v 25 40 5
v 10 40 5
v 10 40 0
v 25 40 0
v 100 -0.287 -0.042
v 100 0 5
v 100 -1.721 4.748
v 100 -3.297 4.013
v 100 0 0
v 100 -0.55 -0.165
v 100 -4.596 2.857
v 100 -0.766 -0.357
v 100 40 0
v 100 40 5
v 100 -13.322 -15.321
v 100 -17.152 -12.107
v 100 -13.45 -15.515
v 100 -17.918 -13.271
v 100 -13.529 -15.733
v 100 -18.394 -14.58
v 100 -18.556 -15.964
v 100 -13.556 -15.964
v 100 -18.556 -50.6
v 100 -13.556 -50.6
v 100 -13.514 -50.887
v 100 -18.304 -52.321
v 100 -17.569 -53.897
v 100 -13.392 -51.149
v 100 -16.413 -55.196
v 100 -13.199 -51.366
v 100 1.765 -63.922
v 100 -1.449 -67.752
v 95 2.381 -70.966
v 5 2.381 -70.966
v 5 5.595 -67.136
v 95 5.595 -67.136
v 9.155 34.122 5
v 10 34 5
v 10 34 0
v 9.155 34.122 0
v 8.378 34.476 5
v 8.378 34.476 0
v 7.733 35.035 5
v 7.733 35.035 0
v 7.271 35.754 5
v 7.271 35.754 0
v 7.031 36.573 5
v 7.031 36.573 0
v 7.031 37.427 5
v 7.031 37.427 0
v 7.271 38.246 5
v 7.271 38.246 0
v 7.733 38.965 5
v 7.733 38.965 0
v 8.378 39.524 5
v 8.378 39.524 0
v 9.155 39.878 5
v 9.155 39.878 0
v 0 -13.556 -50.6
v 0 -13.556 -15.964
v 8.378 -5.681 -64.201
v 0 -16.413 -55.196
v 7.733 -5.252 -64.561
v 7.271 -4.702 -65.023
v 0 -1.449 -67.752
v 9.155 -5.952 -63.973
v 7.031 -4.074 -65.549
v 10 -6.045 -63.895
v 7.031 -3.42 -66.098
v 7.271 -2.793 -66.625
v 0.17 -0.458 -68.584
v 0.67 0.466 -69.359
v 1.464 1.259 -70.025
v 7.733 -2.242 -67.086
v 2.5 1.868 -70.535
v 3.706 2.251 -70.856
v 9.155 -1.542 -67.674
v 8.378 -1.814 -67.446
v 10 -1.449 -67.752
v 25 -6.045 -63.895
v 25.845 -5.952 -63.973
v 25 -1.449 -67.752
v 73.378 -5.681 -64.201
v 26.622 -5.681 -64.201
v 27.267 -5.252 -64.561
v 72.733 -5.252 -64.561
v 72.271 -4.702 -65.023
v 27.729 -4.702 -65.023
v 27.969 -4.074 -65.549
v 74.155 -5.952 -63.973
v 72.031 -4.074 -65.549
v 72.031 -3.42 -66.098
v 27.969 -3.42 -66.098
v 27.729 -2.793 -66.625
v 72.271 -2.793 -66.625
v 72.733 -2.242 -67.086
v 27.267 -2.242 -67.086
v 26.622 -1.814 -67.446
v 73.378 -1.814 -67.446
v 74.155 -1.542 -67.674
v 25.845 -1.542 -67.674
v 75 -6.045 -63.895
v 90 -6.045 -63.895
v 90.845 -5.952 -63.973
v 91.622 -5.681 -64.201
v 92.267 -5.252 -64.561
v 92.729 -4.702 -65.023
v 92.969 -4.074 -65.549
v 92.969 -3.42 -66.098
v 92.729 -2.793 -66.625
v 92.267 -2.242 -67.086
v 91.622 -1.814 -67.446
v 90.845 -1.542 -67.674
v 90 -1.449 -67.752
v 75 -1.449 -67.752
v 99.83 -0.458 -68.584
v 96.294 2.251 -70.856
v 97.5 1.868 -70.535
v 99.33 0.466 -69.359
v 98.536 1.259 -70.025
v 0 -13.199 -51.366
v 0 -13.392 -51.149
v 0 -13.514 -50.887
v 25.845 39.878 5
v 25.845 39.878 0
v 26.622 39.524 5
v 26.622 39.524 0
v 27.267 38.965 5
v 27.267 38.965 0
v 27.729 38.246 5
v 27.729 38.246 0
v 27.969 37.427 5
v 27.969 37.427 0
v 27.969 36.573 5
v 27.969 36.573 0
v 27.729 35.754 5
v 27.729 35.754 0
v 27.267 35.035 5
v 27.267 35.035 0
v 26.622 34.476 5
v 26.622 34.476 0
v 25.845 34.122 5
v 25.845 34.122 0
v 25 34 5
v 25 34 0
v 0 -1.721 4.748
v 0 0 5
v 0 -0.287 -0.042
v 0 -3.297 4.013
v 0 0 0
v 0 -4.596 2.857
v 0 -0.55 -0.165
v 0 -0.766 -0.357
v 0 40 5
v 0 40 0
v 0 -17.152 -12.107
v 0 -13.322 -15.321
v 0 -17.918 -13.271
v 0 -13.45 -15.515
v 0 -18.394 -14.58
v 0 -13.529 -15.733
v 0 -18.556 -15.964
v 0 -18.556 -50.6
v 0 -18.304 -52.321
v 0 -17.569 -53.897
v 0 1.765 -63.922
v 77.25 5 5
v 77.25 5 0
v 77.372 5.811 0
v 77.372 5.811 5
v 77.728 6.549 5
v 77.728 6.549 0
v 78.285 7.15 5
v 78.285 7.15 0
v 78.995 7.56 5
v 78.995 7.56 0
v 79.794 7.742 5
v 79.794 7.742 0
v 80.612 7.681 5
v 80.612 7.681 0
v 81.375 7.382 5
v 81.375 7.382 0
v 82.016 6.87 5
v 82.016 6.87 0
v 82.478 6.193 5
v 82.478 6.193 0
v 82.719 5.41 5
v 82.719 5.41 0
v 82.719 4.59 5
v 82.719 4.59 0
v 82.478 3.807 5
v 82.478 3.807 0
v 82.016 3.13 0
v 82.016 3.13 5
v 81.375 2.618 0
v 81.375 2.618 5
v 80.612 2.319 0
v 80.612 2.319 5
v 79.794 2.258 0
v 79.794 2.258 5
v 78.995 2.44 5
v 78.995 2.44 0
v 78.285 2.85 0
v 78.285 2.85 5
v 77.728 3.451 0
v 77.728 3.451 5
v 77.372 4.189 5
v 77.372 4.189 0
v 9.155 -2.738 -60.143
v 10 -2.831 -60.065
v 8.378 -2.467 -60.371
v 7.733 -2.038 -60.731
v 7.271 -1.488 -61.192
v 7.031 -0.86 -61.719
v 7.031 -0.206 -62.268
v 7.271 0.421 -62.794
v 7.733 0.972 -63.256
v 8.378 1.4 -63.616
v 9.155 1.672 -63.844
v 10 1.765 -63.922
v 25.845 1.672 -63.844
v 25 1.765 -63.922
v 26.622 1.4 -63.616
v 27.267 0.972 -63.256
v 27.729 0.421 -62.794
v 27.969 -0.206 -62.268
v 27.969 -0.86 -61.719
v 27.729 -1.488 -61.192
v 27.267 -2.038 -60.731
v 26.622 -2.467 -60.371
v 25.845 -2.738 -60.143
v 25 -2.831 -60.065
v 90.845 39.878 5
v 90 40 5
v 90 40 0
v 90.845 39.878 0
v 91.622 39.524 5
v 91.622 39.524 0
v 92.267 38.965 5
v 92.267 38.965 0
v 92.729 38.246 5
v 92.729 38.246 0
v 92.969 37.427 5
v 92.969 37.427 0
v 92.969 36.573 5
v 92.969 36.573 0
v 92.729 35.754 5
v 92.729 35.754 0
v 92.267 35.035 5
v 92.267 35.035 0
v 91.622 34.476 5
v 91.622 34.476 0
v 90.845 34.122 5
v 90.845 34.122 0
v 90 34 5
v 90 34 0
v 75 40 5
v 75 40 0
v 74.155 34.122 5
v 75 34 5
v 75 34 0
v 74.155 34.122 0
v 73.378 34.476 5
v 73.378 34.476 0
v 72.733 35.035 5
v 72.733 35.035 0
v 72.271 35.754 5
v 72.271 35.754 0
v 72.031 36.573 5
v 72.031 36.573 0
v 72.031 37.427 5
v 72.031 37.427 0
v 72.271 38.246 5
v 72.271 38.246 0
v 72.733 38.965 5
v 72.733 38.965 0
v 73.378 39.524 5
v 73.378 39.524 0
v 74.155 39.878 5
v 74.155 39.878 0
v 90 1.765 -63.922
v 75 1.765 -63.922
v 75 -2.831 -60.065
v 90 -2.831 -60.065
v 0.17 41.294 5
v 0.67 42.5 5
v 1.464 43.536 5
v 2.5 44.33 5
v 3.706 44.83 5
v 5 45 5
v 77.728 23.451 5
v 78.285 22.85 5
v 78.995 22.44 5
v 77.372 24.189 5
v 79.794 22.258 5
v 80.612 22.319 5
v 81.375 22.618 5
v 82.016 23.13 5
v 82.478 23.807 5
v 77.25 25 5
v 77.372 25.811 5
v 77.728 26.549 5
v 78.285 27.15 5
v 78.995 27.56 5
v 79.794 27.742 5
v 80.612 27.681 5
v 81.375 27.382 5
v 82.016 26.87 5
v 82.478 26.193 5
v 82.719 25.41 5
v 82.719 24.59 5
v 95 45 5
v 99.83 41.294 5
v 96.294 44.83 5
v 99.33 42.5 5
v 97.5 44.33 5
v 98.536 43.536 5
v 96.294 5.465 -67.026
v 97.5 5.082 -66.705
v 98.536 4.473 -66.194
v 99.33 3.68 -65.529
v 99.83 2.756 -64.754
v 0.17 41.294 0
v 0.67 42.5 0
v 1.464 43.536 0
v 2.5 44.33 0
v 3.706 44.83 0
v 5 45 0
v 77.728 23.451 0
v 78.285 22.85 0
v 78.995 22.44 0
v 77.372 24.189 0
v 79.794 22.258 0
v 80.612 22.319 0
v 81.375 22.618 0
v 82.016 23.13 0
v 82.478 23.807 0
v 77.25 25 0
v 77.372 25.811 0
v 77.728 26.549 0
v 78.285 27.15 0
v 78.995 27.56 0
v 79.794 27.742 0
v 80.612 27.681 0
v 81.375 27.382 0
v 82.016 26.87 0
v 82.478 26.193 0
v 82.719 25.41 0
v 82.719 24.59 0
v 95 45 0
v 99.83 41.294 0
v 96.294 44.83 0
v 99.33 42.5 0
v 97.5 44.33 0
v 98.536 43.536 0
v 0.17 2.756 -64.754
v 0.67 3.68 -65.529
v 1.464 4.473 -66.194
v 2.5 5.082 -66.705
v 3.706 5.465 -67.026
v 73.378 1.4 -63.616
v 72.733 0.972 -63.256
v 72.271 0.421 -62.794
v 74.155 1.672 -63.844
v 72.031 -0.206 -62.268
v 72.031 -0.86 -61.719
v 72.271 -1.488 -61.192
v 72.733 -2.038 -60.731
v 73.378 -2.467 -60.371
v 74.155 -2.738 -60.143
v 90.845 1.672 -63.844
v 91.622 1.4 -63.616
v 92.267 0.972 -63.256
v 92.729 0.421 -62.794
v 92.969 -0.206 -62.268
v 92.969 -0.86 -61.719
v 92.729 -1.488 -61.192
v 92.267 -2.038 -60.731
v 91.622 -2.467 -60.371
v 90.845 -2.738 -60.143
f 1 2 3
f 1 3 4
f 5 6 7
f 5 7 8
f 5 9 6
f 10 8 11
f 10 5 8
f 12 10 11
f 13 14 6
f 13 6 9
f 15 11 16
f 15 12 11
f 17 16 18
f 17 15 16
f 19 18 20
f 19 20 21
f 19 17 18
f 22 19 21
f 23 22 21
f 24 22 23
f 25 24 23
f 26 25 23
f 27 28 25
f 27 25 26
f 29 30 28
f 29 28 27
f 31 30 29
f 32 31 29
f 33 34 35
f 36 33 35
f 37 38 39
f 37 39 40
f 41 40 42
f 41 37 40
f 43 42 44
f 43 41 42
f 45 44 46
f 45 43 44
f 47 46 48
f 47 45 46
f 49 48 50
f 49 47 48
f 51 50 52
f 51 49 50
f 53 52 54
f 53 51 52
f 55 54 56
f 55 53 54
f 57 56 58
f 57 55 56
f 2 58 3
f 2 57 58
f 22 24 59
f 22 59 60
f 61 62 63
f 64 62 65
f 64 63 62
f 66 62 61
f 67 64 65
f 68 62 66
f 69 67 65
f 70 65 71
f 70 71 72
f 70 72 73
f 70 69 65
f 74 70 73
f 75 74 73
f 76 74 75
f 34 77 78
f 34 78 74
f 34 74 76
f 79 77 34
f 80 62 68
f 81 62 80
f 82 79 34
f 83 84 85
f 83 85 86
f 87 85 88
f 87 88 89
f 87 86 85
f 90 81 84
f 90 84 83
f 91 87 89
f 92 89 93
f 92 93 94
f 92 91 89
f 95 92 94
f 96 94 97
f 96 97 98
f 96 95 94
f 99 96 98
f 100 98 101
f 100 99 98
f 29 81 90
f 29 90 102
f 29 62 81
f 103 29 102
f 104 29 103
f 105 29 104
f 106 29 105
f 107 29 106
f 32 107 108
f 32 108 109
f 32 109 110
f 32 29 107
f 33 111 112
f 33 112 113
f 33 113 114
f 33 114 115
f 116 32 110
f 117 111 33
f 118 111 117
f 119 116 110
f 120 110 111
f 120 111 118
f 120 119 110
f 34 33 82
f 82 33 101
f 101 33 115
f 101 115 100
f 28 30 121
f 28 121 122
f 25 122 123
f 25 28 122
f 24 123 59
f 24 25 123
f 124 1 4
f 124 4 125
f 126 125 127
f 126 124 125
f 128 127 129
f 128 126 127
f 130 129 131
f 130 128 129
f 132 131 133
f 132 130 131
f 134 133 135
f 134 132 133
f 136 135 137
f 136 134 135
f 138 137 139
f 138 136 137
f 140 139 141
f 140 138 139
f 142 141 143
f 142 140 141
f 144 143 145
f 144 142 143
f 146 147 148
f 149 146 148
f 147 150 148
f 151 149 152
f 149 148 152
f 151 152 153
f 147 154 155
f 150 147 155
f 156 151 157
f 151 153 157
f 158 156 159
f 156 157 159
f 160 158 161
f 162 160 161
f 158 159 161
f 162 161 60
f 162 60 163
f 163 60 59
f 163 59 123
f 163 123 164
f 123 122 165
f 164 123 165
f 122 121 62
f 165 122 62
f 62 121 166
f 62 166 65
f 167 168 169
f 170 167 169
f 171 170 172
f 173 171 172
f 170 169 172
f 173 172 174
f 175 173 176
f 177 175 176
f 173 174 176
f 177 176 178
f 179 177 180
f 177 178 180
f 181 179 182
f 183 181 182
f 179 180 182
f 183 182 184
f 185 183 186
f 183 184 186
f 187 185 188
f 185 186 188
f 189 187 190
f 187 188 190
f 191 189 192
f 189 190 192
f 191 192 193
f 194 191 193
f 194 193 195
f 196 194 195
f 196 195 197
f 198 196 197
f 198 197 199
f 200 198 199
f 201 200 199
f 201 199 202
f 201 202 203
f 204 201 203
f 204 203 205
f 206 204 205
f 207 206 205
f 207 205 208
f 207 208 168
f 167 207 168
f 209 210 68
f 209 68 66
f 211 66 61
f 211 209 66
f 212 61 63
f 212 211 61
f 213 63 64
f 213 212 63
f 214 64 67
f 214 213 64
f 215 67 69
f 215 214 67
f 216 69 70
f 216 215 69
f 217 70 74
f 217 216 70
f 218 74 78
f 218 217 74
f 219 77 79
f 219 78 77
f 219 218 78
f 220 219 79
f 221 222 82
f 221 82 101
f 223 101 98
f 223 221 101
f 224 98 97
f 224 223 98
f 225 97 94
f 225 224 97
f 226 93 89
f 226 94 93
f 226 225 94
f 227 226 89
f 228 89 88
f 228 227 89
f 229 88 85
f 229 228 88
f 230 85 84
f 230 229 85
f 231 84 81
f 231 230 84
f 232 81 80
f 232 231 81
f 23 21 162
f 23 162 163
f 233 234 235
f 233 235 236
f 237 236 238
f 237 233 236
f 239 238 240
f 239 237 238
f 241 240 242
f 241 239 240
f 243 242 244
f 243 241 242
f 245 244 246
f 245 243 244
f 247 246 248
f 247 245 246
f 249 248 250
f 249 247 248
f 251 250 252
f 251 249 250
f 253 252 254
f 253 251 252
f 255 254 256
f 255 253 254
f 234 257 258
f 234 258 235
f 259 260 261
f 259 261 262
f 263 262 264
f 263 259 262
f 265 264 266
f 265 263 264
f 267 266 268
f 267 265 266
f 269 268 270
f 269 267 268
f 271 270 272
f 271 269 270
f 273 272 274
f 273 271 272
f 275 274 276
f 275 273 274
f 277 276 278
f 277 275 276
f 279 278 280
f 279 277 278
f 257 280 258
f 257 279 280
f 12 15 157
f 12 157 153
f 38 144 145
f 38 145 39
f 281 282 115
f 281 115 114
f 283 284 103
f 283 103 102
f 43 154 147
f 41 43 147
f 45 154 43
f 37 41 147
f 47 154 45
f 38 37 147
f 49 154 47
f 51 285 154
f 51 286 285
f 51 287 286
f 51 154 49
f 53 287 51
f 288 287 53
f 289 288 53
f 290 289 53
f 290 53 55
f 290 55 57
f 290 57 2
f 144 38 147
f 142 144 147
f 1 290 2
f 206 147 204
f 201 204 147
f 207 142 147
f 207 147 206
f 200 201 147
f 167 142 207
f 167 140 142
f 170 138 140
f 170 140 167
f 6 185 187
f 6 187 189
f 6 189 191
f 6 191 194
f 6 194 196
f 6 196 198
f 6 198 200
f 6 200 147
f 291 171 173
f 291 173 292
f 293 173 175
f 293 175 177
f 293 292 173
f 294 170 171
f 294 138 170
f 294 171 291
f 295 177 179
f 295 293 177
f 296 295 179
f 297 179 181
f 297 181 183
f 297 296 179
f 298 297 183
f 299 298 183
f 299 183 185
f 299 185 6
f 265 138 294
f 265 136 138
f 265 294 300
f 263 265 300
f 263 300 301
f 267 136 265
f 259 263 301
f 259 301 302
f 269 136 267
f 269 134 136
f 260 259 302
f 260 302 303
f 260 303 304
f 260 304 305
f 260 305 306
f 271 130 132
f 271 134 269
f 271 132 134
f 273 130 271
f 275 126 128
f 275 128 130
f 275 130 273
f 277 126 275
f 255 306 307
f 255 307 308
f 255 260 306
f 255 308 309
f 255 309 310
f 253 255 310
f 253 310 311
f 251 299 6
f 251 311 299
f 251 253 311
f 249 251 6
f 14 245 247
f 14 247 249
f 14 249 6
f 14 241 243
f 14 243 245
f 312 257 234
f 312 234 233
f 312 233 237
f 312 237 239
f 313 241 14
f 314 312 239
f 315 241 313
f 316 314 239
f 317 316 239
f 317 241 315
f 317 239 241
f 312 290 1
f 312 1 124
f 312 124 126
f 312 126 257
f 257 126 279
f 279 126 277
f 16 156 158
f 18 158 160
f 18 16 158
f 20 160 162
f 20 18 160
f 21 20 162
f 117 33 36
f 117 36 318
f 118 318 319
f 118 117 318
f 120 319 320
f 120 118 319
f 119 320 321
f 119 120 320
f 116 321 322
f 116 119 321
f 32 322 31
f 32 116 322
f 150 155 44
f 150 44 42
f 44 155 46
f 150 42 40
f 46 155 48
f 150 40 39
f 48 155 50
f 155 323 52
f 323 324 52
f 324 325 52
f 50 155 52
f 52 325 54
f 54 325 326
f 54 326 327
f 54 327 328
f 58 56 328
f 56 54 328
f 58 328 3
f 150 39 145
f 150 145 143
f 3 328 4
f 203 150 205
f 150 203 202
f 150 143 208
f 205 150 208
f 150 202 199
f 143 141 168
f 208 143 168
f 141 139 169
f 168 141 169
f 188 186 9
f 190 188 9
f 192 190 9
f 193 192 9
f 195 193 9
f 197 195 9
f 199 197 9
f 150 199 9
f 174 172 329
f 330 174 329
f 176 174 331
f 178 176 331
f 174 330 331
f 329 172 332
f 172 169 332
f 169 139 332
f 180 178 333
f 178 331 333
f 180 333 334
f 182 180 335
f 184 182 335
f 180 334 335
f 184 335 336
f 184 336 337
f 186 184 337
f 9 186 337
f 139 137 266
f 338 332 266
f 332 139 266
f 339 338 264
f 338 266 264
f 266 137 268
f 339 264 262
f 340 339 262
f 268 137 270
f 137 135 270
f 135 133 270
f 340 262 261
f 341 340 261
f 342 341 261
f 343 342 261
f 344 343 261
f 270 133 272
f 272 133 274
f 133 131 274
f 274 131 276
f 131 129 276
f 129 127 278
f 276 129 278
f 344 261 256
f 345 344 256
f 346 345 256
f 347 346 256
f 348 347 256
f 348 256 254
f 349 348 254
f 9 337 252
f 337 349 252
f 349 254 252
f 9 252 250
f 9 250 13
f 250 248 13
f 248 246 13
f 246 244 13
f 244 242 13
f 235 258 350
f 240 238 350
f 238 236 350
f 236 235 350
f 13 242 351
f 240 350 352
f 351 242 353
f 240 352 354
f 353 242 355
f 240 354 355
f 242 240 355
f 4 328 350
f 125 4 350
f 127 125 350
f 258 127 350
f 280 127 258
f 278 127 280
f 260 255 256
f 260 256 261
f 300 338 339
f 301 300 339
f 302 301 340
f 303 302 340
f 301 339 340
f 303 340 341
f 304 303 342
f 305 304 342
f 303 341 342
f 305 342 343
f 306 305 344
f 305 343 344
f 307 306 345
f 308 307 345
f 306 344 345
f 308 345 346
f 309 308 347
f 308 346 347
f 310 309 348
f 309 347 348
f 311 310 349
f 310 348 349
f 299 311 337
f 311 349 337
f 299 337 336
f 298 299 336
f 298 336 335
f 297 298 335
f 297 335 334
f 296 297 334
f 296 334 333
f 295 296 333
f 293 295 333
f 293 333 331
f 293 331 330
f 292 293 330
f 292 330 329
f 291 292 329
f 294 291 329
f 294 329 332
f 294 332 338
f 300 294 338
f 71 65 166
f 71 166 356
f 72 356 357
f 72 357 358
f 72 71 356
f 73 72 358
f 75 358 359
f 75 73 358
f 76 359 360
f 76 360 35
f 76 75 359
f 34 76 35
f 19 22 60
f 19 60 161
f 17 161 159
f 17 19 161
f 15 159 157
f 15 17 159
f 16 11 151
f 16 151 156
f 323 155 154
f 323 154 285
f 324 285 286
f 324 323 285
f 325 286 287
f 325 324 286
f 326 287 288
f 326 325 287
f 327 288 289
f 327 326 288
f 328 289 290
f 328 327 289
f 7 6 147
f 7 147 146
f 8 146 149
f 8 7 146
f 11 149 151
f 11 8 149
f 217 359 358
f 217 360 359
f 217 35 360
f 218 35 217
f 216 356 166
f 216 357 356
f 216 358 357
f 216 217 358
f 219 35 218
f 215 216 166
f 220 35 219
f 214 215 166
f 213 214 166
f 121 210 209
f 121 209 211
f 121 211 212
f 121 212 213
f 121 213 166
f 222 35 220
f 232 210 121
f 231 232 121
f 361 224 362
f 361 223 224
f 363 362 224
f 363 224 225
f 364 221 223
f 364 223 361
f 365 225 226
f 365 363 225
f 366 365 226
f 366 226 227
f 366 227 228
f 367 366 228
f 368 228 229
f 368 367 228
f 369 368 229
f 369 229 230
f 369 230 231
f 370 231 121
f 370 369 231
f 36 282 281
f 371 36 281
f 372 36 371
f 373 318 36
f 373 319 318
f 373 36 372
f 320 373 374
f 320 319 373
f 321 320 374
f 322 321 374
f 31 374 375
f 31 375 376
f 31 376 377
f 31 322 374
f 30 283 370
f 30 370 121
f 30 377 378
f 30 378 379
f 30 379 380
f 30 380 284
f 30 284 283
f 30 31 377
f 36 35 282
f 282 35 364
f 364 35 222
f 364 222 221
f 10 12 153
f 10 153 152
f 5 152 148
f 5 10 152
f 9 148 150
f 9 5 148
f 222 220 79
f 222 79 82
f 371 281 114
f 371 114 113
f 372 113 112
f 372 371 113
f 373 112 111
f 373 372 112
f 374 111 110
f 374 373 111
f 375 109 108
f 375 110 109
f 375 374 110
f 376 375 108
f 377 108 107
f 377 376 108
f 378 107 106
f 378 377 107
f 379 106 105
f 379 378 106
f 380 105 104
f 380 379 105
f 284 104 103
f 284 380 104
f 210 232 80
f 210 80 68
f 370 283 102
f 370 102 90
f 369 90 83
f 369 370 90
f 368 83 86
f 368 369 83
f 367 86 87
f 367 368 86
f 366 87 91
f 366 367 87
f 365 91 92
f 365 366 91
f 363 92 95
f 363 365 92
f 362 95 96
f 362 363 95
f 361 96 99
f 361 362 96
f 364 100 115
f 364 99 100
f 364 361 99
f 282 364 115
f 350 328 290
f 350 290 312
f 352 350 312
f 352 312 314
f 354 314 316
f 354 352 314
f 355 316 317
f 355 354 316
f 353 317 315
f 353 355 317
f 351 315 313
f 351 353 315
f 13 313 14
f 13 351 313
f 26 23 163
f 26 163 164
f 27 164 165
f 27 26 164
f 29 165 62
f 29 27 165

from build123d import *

# Parameters (mm, degrees)
SKETCH1_W                = 100
SKETCH1_H                = 45
BASE_FLANGE1_DEPTH       = 5
EDGE_FLANGE1_DEPTH       = 100
EDGE_FLANGE2_DEPTH       = 100
EDGE_FLANGE3_DEPTH       = 100
CUT_EXTRUDE1_REACH       = 135.401
SKETCH15_R               = 2.5
CUT_EXTRUDE2_DEPTH       = 10
M5_CLEARANCE_HOLE1_D     = 5.5
M5_CLEARANCE_HOLE1_DEPTH = 15.966
M5_CLEARANCE_HOLE1_TIP   = 1.652366702
BREAK_CORNER1_START      = -52.832474919
BREAK_CORNER1_DEPTH      = 5
BREAK_CORNER1_2_DEPTH    = 5


# Read off the part's stored shape, not the designer's step: Break-Corner1
# Sheet-metal steps are written as plain solids
with BuildPart() as part:
    # Sketch1 → Base-Flange1 (new body)
    with BuildSketch(Plane.XY):
        with Locations((50, 22.5)):
            Rectangle(SKETCH1_W, SKETCH1_H)
    extrude(amount=BASE_FLANGE1_DEPTH)

    # Edge-Flange1 section (across the edge) → Edge-Flange1 (add)
    with BuildSketch(Plane(origin=(100, -0.466307658, 0), x_dir=(0, 0.7660444431189746, -0.6427876096865435), z_dir=(-1, 0, 0))):
        with BuildLine():
            Line((-5, 0.466307658), (-5, 20))
            Line((-5, 20), (0, 20))
            Line((0, 20), (0, 0.466307658))
            ThreePointArc((0, 0.466307658), (0.093692213, 0.043689396), (0.35721239, -0.299736785))
            Line((0.35721239, -0.299736785), (-2.856725658, -4.129959001))
            ThreePointArc((-2.856725658, -4.129959001), (-4.437846722, -2.069401912), (-5, 0.466307658))
        make_face()
    extrude(amount=EDGE_FLANGE1_DEPTH)

    # Edge-Flange2 section (across the edge) → Edge-Flange2 (add)
    with BuildSketch(Plane(origin=(100, -13.556015409, -15.599706238), x_dir=(0, 1, 0), z_dir=(-1, 0, 0))):
        with BuildLine():
            Line((-5, 0.363970234), (-5, 35))
            Line((-5, 35), (0, 35))
            Line((0, 35), (0, 0.363970234))
            ThreePointArc((0, 0.363970234), (0.060307379, 0.021950091), (0.233955557, -0.278817375))
            Line((0.233955557, -0.278817375), (-3.596266659, -3.492755424))
            ThreePointArc((-3.596266659, -3.492755424), (-4.638155725, -1.688150626), (-5, 0.363970234))
        make_face()
    extrude(amount=EDGE_FLANGE2_DEPTH)

    # Edge-Flange3 section (across the edge) → Edge-Flange3 (add)
    with BuildSketch(Plane(origin=(100, -13.556015409, -51.066013896), x_dir=(0, 0.6427876096865516, 0.7660444431189678), z_dir=(-1, 0, 0))):
        with BuildLine():
            Line((-5, 0.466307658), (-5, 25))
            Line((-5, 25), (0, 25))
            Line((0, 25), (0, 0.466307658))
            ThreePointArc((0, 0.466307658), (0.093692213, 0.043689396), (0.35721239, -0.299736785))
            Line((0.35721239, -0.299736785), (-2.856725658, -4.129959001))
            ThreePointArc((-2.856725658, -4.129959001), (-4.437846722, -2.069401912), (-5, 0.466307658))
        make_face()
    extrude(amount=EDGE_FLANGE3_DEPTH)

    # Sketch15 → Cut-Extrude1 (cut, up to next)
    with BuildSketch(Plane.XY.offset(5), mode=Mode.PRIVATE) as cut_extrude1_sk1:
        with Locations((80, 5)):
            Circle(SKETCH15_R)
    cut_extrude1_tool1 = extrude(cut_extrude1_sk1.sketch, amount=-CUT_EXTRUDE1_REACH, mode=Mode.PRIVATE) & part.part
    # Sketch15 → Cut-Extrude1 (cut, up to next)
    with BuildSketch(Plane.XY.offset(5), mode=Mode.PRIVATE) as cut_extrude1_sk2:
        with Locations((80, 25)):
            Circle(SKETCH15_R)
    cut_extrude1_tool2 = extrude(cut_extrude1_sk2.sketch, amount=-CUT_EXTRUDE1_REACH, mode=Mode.PRIVATE) & part.part
    # Sketch15 → Cut-Extrude1 (cut, up to next)
    with BuildSketch(Plane.XY.offset(5), mode=Mode.PRIVATE) as cut_extrude1_sk3:
        with BuildLine():
            Line((10, 40), (25, 40))
            ThreePointArc((25, 40), (28, 37), (25, 34))
            Line((25, 34), (10, 34))
            ThreePointArc((10, 34), (7, 37), (10, 40))
        make_face()
    cut_extrude1_tool3 = extrude(cut_extrude1_sk3.sketch, amount=-CUT_EXTRUDE1_REACH, mode=Mode.PRIVATE) & part.part
    # Sketch15 → Cut-Extrude1 (cut, up to next)
    with BuildSketch(Plane.XY.offset(5), mode=Mode.PRIVATE) as cut_extrude1_sk4:
        with BuildLine():
            Line((75, 40), (90, 40))
            ThreePointArc((90, 40), (93, 37), (90, 34))
            Line((90, 34), (75, 34))
            ThreePointArc((75, 34), (72, 37), (75, 40))
        make_face()
    cut_extrude1_tool4 = extrude(cut_extrude1_sk4.sketch, amount=-CUT_EXTRUDE1_REACH, mode=Mode.PRIVATE) & part.part
    add(cut_extrude1_tool1.solids().sort_by_distance((80, 5, 5))[0], mode=Mode.SUBTRACT)
    add(cut_extrude1_tool2.solids().sort_by_distance((80, 25, 5))[0], mode=Mode.SUBTRACT)
    add(cut_extrude1_tool3.solids().sort_by_distance((17.5, 37, 5))[0], mode=Mode.SUBTRACT)
    add(cut_extrude1_tool4.solids().sort_by_distance((82.5, 37, 5))[0], mode=Mode.SUBTRACT)

    # Sketch16 → Cut-Extrude2 (cut)
    with BuildSketch(Plane(origin=(0, -30.746122218, -36.641801612), x_dir=(1, 0, 0), z_dir=(0, 0.6427876096865515, 0.7660444431189678))):
        with BuildLine():
            Line((10, 42.440090734), (25, 42.440090734))
            ThreePointArc((25, 42.440090734), (28, 39.440090734), (25, 36.440090734))
            Line((25, 36.440090734), (10, 36.440090734))
            ThreePointArc((10, 36.440090734), (7, 39.440090734), (10, 42.440090734))
        make_face()
        with BuildLine():
            Line((75, 42.440090734), (90, 42.440090734))
            ThreePointArc((90, 42.440090734), (93, 39.440090734), (90, 36.440090734))
            Line((90, 36.440090734), (75, 36.440090734))
            ThreePointArc((75, 36.440090734), (72, 39.440090734), (75, 42.440090734))
        make_face()
    extrude(amount=-CUT_EXTRUDE2_DEPTH, mode=Mode.SUBTRACT)

    # M5 Clearance Hole1
    with Locations(Plane.XY.offset(5)):
        with Locations((80, 25), (80, 5)):
            Hole(M5_CLEARANCE_HOLE1_D / 2, depth=M5_CLEARANCE_HOLE1_DEPTH)
            with Locations((0, 0, -(M5_CLEARANCE_HOLE1_DEPTH + M5_CLEARANCE_HOLE1_TIP / 2))):  # 118° drill point
                Cone(0, M5_CLEARANCE_HOLE1_D / 2, M5_CLEARANCE_HOLE1_TIP, mode=Mode.SUBTRACT)

    # Break-Corner1 outline → Break-Corner1 (cut)
    with BuildSketch(Plane(origin=(0, 0, 0), x_dir=(1, 0, 0), z_dir=(0, 0.6427876096865517, 0.7660444431189677)).offset(BREAK_CORNER1_START)):
        with BuildLine():
            ThreePointArc((0, 42.440090734), (1.464466094, 45.97562464), (5, 47.440090734))
            Line((5, 47.440090734), (0, 47.440090734))
            Line((0, 47.440090734), (0, 42.440090734))
        make_face()
        with BuildLine():
            ThreePointArc((95, 47.440090734), (98.535533906, 45.97562464), (100, 42.440090734))
            Line((100, 42.440090734), (100, 47.440090734))
            Line((100, 47.440090734), (95, 47.440090734))
        make_face()
    extrude(amount=BREAK_CORNER1_DEPTH, mode=Mode.SUBTRACT)

    # Break-Corner1 2 outline → Break-Corner1 2 (cut)
    with BuildSketch(Plane.XY):
        with BuildLine():
            Line((0, 45), (0, 40))
            ThreePointArc((0, 40), (1.464466094, 43.535533906), (5, 45))
            Line((5, 45), (0, 45))
        make_face()
        with BuildLine():
            Line((100, 45), (95, 45))
            ThreePointArc((95, 45), (98.535533906, 43.535533906), (100, 40))
            Line((100, 40), (100, 45))
        make_face()
    extrude(amount=BREAK_CORNER1_2_DEPTH, mode=Mode.SUBTRACT)


solid = part.part
